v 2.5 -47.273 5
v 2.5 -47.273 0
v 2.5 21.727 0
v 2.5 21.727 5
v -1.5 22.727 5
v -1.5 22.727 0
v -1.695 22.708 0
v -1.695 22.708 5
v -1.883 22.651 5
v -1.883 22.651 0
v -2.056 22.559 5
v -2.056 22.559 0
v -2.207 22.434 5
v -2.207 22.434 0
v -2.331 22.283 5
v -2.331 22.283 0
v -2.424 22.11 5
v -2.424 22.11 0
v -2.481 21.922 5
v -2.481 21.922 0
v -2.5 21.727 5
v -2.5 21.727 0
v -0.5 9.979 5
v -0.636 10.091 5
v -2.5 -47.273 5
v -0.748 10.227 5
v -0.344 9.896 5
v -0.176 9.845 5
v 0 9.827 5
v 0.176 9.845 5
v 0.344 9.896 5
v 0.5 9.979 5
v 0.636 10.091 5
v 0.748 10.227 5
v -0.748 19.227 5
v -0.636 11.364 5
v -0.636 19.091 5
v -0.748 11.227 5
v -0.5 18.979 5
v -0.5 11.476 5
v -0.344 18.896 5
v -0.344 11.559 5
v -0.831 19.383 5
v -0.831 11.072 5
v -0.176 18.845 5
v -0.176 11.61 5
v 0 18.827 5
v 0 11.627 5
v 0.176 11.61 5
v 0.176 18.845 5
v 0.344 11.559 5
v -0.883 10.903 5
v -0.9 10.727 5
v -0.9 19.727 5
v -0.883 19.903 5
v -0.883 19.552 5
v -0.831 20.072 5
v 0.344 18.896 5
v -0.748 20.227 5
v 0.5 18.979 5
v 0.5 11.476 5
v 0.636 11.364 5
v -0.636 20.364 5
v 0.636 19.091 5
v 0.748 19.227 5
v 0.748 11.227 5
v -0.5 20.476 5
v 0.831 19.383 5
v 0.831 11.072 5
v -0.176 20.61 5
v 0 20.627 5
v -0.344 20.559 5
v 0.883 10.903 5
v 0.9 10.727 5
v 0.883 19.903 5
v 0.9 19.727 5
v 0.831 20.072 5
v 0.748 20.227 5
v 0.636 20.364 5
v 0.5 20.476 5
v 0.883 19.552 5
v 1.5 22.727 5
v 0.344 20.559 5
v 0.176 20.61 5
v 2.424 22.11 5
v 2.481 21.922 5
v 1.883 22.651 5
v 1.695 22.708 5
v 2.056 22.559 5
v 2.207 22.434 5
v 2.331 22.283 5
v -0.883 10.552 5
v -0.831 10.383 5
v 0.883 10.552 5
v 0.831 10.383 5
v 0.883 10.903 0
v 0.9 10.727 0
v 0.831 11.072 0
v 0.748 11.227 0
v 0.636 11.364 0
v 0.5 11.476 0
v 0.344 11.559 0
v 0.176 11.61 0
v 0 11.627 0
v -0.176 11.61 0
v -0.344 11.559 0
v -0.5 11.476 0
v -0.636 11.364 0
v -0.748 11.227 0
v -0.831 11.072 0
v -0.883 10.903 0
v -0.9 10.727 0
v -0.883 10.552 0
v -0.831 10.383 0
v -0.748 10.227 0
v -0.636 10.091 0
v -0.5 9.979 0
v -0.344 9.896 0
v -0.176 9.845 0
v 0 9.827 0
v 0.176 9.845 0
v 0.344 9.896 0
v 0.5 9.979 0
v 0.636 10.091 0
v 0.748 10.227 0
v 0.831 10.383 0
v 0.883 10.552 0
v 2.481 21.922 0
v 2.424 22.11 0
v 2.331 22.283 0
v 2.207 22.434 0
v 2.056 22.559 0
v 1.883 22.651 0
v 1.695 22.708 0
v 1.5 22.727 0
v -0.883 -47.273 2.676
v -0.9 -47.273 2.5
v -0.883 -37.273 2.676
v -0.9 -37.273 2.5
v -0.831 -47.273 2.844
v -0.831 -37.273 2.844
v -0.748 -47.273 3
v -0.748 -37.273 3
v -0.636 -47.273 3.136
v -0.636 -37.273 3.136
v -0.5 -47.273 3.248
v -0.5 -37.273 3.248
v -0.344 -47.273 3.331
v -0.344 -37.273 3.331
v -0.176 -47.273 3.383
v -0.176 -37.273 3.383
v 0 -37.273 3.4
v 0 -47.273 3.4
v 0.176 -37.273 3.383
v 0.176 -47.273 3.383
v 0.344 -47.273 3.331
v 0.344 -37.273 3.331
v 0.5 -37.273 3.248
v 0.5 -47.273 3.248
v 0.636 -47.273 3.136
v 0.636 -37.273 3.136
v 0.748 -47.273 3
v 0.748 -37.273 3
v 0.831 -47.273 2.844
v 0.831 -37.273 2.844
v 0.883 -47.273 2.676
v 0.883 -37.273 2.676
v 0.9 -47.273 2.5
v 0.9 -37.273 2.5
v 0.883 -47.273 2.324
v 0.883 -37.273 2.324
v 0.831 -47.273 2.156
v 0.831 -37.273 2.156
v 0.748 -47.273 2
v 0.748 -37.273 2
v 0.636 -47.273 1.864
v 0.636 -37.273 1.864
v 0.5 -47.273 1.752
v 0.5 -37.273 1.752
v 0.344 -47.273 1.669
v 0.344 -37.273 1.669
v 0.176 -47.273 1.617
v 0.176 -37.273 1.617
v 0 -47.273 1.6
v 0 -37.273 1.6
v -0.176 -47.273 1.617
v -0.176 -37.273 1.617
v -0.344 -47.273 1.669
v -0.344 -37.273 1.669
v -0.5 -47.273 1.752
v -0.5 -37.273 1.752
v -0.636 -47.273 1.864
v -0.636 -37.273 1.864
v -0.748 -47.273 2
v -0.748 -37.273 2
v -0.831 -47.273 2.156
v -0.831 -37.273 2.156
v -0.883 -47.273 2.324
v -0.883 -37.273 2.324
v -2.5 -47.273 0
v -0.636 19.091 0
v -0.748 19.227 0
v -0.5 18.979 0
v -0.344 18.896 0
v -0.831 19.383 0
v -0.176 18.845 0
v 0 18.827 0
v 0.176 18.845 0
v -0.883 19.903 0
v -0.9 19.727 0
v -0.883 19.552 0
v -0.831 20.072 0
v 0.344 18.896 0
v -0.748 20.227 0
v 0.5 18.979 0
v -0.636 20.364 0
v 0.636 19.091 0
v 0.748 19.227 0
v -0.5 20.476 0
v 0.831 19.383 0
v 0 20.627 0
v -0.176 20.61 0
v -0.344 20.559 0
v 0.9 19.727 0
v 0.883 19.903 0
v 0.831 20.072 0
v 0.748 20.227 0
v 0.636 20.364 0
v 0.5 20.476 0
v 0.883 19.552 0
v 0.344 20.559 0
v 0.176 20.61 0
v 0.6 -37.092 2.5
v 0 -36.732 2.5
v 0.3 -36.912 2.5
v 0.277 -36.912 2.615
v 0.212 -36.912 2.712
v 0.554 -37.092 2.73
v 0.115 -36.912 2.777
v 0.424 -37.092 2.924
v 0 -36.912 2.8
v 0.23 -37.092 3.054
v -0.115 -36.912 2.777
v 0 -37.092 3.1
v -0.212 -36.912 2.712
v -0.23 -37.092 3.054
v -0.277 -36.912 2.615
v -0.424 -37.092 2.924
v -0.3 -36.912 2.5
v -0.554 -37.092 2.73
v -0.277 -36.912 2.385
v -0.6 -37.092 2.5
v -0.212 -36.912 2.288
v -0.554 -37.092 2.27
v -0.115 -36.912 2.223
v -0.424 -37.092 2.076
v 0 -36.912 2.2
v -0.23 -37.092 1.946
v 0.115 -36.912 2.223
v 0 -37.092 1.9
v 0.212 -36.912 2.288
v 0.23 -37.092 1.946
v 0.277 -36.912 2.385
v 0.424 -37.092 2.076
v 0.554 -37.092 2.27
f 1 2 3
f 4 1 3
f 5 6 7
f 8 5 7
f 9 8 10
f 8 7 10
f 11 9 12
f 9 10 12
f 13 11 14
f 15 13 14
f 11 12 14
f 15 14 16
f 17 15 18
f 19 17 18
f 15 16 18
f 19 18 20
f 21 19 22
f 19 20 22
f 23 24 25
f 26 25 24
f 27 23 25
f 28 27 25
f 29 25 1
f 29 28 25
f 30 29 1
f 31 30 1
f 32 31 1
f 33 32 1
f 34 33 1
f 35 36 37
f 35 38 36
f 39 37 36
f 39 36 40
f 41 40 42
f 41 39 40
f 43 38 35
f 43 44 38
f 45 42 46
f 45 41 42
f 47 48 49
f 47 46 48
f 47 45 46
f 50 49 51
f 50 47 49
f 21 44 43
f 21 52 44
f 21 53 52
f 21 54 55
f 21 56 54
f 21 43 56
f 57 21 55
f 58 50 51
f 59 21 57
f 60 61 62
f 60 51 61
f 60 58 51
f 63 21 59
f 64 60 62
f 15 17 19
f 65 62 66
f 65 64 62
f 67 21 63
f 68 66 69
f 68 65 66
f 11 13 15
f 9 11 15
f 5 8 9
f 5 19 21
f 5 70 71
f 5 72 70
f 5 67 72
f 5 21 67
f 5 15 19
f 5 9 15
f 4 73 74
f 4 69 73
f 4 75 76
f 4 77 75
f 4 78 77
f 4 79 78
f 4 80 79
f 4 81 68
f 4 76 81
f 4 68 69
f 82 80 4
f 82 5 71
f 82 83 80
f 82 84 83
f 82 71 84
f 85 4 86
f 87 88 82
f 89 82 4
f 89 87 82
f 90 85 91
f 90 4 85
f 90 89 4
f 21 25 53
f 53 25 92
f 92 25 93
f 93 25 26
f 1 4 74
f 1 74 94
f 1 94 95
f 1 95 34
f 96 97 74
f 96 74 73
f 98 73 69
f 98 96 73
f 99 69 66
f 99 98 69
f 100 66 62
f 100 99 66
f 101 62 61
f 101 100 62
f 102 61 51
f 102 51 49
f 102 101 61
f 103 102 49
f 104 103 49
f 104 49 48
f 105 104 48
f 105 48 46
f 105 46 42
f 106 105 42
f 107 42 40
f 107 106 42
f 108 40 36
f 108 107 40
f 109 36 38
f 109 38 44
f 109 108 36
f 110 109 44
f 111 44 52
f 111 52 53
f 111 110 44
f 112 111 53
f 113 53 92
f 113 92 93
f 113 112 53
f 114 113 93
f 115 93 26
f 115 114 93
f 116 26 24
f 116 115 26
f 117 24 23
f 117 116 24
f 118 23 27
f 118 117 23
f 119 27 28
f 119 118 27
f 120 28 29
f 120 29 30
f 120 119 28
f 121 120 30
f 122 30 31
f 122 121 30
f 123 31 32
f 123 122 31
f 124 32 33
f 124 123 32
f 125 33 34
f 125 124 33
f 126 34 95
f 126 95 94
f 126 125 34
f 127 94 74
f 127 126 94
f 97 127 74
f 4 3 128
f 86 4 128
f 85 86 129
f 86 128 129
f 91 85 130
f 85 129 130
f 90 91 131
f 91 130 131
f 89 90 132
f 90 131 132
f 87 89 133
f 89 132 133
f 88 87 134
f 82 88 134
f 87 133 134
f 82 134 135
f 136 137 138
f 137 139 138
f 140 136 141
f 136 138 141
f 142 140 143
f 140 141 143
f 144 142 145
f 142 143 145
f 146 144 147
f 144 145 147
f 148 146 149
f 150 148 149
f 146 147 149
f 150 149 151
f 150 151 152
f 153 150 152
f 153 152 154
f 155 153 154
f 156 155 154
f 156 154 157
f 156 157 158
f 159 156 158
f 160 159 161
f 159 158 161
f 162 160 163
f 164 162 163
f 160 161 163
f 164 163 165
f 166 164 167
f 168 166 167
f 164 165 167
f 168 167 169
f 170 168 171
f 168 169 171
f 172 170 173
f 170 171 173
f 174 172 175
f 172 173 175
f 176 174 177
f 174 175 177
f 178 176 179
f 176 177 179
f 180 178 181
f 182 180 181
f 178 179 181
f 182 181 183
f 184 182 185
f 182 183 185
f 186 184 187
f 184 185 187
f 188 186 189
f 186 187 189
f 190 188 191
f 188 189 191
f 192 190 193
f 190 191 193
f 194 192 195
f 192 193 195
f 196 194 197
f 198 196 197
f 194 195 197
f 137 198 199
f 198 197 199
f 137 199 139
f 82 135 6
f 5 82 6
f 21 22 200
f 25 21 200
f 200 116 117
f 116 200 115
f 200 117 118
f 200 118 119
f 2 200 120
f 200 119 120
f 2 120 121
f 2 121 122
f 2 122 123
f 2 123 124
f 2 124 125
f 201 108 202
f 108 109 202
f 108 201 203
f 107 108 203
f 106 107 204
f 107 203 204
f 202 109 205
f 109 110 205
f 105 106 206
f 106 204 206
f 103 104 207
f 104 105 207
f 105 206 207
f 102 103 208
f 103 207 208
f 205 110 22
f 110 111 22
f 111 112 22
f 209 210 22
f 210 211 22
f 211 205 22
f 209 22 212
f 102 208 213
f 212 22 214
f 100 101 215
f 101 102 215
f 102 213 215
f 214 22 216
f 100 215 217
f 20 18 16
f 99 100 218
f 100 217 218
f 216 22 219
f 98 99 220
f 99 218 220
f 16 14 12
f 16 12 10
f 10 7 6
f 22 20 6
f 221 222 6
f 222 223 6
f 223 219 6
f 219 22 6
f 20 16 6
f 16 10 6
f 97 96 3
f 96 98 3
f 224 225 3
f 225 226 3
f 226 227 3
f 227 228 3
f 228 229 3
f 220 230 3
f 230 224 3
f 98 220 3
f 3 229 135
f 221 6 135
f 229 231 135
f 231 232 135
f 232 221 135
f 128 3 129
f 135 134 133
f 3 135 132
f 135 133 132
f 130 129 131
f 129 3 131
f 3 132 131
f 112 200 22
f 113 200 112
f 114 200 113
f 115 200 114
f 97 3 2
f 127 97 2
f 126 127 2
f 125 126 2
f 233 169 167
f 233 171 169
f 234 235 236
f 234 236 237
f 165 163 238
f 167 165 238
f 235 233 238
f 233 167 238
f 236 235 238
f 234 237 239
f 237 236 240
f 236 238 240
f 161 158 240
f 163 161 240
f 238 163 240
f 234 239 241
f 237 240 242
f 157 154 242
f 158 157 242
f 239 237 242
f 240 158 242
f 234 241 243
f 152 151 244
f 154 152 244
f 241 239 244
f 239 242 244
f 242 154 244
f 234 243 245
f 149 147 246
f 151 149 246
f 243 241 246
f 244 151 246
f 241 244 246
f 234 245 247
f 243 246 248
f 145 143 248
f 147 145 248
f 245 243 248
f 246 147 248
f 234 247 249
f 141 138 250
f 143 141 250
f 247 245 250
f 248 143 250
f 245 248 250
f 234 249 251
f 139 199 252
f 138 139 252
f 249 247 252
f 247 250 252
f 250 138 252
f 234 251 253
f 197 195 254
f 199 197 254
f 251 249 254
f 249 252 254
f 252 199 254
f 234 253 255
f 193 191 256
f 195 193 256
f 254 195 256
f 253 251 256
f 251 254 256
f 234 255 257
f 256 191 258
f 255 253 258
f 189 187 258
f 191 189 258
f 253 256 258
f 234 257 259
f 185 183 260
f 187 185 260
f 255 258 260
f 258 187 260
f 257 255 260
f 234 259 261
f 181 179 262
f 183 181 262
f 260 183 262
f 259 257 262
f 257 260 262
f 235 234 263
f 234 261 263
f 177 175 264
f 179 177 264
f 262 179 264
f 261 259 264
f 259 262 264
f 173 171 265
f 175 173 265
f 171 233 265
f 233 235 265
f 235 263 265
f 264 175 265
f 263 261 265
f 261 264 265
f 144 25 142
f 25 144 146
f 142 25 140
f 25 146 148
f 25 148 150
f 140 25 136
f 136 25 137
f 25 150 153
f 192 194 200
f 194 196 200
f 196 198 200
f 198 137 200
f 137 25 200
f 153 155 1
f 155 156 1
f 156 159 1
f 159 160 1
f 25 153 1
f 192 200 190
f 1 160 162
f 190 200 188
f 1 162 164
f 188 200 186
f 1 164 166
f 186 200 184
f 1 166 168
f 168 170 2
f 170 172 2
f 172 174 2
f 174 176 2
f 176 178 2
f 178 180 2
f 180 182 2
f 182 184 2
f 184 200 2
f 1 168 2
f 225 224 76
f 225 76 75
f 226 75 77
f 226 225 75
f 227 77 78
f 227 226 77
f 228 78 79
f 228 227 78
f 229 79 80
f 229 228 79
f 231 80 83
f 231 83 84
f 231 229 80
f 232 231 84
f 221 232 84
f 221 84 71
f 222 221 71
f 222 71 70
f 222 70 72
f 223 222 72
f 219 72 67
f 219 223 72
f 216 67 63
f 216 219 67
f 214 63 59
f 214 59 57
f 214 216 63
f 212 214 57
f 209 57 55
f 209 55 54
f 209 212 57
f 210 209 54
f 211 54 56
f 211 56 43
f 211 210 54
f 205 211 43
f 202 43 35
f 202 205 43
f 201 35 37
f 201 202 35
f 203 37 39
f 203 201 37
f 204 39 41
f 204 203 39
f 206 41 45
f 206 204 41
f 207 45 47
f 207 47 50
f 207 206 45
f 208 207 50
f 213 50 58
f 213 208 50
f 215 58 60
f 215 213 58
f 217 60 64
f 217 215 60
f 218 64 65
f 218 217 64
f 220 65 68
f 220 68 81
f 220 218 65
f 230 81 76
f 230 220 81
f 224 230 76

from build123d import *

# Parameters (mm, degrees)
F0_R     = 0.9
F1_DEPTH = 5
F3_D     = 1.8
F3_DEPTH = 10
F3_TIP   = 0.5407745571


with BuildPart() as f1:
    # F0 (on Top) → F1 (new body)
    with BuildSketch(Plane.XY):
        with BuildLine():
            ThreePointArc((2.5, 21.7272822881), (2.2071067812, 22.4343890692), (1.5, 22.7272822881))
            Line((1.5, 22.7272822881), (-1.5, 22.7272822881))
            ThreePointArc((-1.5, 22.7272822881), (-2.2071067812, 22.4343890692), (-2.5, 21.7272822881))
            Line((-2.5, 21.7272822881), (-2.5, -47.2727177119))
            Line((-2.5, -47.2727177119), (2.5, -47.2727177119))
            Line((2.5, -47.2727177119), (2.5, 21.7272822881))
        make_face()
        with Locations((0, 10.7272822881)):
            Circle(F0_R, mode=Mode.SUBTRACT)
        with Locations((0, 19.7272822881)):
            Circle(F0_R, mode=Mode.SUBTRACT)
    extrude(amount=F1_DEPTH)

    # F3
    with Locations(Plane.XZ.offset(47.2727177119)):
        with Locations((0, 2.5)):
            Hole(F3_D / 2, depth=F3_DEPTH)
            with Locations((0, 0, -(F3_DEPTH + F3_TIP / 2))):  # 118° drill point
                Cone(0, F3_D / 2, F3_TIP, mode=Mode.SUBTRACT)


solid = f1.part
